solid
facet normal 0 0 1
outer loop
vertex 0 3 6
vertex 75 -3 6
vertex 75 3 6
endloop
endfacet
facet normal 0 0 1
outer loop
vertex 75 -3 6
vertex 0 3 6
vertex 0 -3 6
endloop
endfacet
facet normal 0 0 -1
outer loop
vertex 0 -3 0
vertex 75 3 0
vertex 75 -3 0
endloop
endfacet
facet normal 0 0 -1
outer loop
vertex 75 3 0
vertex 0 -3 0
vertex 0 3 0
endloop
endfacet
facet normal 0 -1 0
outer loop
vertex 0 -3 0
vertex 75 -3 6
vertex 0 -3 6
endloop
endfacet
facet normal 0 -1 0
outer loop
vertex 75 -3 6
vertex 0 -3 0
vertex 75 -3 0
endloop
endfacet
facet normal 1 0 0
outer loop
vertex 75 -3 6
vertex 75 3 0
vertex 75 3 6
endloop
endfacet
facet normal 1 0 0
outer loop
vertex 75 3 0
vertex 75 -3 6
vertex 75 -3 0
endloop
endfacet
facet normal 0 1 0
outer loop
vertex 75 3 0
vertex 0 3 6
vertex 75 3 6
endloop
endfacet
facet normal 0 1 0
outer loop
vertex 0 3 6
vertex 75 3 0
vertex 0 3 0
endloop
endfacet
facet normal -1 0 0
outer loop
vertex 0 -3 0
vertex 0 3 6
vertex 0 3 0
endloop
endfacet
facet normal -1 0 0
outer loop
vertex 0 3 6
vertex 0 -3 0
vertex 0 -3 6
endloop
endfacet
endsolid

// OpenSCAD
shaft_insert_height = 4;
shaft_diameter = 12;

cruz_base_diameter = 15;
cruz_base_height = 10;

arm_length= 150/2;
arm_height = cruz_base_height - shaft_insert_height;

module shaft_insert(){
    cylinder(shaft_insert_height, d=shaft_diameter, $fn=60);
}
module cruz_base(){
        difference(){
                {cylinder(cruz_base_height, d=cruz_base_diameter, $fn=60);}
                translate([0, 0, cruz_base_height - shaft_insert_height + 0.1]) {shaft_insert();}
            
        }
 }
 
 module arm(){
     translate([0, -arm_height/2, 0]) cube([arm_length, arm_height, arm_height]);
     }
 
 module cruz(){
     difference() {
         {cruz_base();}
         rotate([0, 0, 0]) {arm();}
         rotate([0, 0, 120]) {arm();}
         rotate([0, 0, 2400]) {arm();}
         }
 }
 
arm();
